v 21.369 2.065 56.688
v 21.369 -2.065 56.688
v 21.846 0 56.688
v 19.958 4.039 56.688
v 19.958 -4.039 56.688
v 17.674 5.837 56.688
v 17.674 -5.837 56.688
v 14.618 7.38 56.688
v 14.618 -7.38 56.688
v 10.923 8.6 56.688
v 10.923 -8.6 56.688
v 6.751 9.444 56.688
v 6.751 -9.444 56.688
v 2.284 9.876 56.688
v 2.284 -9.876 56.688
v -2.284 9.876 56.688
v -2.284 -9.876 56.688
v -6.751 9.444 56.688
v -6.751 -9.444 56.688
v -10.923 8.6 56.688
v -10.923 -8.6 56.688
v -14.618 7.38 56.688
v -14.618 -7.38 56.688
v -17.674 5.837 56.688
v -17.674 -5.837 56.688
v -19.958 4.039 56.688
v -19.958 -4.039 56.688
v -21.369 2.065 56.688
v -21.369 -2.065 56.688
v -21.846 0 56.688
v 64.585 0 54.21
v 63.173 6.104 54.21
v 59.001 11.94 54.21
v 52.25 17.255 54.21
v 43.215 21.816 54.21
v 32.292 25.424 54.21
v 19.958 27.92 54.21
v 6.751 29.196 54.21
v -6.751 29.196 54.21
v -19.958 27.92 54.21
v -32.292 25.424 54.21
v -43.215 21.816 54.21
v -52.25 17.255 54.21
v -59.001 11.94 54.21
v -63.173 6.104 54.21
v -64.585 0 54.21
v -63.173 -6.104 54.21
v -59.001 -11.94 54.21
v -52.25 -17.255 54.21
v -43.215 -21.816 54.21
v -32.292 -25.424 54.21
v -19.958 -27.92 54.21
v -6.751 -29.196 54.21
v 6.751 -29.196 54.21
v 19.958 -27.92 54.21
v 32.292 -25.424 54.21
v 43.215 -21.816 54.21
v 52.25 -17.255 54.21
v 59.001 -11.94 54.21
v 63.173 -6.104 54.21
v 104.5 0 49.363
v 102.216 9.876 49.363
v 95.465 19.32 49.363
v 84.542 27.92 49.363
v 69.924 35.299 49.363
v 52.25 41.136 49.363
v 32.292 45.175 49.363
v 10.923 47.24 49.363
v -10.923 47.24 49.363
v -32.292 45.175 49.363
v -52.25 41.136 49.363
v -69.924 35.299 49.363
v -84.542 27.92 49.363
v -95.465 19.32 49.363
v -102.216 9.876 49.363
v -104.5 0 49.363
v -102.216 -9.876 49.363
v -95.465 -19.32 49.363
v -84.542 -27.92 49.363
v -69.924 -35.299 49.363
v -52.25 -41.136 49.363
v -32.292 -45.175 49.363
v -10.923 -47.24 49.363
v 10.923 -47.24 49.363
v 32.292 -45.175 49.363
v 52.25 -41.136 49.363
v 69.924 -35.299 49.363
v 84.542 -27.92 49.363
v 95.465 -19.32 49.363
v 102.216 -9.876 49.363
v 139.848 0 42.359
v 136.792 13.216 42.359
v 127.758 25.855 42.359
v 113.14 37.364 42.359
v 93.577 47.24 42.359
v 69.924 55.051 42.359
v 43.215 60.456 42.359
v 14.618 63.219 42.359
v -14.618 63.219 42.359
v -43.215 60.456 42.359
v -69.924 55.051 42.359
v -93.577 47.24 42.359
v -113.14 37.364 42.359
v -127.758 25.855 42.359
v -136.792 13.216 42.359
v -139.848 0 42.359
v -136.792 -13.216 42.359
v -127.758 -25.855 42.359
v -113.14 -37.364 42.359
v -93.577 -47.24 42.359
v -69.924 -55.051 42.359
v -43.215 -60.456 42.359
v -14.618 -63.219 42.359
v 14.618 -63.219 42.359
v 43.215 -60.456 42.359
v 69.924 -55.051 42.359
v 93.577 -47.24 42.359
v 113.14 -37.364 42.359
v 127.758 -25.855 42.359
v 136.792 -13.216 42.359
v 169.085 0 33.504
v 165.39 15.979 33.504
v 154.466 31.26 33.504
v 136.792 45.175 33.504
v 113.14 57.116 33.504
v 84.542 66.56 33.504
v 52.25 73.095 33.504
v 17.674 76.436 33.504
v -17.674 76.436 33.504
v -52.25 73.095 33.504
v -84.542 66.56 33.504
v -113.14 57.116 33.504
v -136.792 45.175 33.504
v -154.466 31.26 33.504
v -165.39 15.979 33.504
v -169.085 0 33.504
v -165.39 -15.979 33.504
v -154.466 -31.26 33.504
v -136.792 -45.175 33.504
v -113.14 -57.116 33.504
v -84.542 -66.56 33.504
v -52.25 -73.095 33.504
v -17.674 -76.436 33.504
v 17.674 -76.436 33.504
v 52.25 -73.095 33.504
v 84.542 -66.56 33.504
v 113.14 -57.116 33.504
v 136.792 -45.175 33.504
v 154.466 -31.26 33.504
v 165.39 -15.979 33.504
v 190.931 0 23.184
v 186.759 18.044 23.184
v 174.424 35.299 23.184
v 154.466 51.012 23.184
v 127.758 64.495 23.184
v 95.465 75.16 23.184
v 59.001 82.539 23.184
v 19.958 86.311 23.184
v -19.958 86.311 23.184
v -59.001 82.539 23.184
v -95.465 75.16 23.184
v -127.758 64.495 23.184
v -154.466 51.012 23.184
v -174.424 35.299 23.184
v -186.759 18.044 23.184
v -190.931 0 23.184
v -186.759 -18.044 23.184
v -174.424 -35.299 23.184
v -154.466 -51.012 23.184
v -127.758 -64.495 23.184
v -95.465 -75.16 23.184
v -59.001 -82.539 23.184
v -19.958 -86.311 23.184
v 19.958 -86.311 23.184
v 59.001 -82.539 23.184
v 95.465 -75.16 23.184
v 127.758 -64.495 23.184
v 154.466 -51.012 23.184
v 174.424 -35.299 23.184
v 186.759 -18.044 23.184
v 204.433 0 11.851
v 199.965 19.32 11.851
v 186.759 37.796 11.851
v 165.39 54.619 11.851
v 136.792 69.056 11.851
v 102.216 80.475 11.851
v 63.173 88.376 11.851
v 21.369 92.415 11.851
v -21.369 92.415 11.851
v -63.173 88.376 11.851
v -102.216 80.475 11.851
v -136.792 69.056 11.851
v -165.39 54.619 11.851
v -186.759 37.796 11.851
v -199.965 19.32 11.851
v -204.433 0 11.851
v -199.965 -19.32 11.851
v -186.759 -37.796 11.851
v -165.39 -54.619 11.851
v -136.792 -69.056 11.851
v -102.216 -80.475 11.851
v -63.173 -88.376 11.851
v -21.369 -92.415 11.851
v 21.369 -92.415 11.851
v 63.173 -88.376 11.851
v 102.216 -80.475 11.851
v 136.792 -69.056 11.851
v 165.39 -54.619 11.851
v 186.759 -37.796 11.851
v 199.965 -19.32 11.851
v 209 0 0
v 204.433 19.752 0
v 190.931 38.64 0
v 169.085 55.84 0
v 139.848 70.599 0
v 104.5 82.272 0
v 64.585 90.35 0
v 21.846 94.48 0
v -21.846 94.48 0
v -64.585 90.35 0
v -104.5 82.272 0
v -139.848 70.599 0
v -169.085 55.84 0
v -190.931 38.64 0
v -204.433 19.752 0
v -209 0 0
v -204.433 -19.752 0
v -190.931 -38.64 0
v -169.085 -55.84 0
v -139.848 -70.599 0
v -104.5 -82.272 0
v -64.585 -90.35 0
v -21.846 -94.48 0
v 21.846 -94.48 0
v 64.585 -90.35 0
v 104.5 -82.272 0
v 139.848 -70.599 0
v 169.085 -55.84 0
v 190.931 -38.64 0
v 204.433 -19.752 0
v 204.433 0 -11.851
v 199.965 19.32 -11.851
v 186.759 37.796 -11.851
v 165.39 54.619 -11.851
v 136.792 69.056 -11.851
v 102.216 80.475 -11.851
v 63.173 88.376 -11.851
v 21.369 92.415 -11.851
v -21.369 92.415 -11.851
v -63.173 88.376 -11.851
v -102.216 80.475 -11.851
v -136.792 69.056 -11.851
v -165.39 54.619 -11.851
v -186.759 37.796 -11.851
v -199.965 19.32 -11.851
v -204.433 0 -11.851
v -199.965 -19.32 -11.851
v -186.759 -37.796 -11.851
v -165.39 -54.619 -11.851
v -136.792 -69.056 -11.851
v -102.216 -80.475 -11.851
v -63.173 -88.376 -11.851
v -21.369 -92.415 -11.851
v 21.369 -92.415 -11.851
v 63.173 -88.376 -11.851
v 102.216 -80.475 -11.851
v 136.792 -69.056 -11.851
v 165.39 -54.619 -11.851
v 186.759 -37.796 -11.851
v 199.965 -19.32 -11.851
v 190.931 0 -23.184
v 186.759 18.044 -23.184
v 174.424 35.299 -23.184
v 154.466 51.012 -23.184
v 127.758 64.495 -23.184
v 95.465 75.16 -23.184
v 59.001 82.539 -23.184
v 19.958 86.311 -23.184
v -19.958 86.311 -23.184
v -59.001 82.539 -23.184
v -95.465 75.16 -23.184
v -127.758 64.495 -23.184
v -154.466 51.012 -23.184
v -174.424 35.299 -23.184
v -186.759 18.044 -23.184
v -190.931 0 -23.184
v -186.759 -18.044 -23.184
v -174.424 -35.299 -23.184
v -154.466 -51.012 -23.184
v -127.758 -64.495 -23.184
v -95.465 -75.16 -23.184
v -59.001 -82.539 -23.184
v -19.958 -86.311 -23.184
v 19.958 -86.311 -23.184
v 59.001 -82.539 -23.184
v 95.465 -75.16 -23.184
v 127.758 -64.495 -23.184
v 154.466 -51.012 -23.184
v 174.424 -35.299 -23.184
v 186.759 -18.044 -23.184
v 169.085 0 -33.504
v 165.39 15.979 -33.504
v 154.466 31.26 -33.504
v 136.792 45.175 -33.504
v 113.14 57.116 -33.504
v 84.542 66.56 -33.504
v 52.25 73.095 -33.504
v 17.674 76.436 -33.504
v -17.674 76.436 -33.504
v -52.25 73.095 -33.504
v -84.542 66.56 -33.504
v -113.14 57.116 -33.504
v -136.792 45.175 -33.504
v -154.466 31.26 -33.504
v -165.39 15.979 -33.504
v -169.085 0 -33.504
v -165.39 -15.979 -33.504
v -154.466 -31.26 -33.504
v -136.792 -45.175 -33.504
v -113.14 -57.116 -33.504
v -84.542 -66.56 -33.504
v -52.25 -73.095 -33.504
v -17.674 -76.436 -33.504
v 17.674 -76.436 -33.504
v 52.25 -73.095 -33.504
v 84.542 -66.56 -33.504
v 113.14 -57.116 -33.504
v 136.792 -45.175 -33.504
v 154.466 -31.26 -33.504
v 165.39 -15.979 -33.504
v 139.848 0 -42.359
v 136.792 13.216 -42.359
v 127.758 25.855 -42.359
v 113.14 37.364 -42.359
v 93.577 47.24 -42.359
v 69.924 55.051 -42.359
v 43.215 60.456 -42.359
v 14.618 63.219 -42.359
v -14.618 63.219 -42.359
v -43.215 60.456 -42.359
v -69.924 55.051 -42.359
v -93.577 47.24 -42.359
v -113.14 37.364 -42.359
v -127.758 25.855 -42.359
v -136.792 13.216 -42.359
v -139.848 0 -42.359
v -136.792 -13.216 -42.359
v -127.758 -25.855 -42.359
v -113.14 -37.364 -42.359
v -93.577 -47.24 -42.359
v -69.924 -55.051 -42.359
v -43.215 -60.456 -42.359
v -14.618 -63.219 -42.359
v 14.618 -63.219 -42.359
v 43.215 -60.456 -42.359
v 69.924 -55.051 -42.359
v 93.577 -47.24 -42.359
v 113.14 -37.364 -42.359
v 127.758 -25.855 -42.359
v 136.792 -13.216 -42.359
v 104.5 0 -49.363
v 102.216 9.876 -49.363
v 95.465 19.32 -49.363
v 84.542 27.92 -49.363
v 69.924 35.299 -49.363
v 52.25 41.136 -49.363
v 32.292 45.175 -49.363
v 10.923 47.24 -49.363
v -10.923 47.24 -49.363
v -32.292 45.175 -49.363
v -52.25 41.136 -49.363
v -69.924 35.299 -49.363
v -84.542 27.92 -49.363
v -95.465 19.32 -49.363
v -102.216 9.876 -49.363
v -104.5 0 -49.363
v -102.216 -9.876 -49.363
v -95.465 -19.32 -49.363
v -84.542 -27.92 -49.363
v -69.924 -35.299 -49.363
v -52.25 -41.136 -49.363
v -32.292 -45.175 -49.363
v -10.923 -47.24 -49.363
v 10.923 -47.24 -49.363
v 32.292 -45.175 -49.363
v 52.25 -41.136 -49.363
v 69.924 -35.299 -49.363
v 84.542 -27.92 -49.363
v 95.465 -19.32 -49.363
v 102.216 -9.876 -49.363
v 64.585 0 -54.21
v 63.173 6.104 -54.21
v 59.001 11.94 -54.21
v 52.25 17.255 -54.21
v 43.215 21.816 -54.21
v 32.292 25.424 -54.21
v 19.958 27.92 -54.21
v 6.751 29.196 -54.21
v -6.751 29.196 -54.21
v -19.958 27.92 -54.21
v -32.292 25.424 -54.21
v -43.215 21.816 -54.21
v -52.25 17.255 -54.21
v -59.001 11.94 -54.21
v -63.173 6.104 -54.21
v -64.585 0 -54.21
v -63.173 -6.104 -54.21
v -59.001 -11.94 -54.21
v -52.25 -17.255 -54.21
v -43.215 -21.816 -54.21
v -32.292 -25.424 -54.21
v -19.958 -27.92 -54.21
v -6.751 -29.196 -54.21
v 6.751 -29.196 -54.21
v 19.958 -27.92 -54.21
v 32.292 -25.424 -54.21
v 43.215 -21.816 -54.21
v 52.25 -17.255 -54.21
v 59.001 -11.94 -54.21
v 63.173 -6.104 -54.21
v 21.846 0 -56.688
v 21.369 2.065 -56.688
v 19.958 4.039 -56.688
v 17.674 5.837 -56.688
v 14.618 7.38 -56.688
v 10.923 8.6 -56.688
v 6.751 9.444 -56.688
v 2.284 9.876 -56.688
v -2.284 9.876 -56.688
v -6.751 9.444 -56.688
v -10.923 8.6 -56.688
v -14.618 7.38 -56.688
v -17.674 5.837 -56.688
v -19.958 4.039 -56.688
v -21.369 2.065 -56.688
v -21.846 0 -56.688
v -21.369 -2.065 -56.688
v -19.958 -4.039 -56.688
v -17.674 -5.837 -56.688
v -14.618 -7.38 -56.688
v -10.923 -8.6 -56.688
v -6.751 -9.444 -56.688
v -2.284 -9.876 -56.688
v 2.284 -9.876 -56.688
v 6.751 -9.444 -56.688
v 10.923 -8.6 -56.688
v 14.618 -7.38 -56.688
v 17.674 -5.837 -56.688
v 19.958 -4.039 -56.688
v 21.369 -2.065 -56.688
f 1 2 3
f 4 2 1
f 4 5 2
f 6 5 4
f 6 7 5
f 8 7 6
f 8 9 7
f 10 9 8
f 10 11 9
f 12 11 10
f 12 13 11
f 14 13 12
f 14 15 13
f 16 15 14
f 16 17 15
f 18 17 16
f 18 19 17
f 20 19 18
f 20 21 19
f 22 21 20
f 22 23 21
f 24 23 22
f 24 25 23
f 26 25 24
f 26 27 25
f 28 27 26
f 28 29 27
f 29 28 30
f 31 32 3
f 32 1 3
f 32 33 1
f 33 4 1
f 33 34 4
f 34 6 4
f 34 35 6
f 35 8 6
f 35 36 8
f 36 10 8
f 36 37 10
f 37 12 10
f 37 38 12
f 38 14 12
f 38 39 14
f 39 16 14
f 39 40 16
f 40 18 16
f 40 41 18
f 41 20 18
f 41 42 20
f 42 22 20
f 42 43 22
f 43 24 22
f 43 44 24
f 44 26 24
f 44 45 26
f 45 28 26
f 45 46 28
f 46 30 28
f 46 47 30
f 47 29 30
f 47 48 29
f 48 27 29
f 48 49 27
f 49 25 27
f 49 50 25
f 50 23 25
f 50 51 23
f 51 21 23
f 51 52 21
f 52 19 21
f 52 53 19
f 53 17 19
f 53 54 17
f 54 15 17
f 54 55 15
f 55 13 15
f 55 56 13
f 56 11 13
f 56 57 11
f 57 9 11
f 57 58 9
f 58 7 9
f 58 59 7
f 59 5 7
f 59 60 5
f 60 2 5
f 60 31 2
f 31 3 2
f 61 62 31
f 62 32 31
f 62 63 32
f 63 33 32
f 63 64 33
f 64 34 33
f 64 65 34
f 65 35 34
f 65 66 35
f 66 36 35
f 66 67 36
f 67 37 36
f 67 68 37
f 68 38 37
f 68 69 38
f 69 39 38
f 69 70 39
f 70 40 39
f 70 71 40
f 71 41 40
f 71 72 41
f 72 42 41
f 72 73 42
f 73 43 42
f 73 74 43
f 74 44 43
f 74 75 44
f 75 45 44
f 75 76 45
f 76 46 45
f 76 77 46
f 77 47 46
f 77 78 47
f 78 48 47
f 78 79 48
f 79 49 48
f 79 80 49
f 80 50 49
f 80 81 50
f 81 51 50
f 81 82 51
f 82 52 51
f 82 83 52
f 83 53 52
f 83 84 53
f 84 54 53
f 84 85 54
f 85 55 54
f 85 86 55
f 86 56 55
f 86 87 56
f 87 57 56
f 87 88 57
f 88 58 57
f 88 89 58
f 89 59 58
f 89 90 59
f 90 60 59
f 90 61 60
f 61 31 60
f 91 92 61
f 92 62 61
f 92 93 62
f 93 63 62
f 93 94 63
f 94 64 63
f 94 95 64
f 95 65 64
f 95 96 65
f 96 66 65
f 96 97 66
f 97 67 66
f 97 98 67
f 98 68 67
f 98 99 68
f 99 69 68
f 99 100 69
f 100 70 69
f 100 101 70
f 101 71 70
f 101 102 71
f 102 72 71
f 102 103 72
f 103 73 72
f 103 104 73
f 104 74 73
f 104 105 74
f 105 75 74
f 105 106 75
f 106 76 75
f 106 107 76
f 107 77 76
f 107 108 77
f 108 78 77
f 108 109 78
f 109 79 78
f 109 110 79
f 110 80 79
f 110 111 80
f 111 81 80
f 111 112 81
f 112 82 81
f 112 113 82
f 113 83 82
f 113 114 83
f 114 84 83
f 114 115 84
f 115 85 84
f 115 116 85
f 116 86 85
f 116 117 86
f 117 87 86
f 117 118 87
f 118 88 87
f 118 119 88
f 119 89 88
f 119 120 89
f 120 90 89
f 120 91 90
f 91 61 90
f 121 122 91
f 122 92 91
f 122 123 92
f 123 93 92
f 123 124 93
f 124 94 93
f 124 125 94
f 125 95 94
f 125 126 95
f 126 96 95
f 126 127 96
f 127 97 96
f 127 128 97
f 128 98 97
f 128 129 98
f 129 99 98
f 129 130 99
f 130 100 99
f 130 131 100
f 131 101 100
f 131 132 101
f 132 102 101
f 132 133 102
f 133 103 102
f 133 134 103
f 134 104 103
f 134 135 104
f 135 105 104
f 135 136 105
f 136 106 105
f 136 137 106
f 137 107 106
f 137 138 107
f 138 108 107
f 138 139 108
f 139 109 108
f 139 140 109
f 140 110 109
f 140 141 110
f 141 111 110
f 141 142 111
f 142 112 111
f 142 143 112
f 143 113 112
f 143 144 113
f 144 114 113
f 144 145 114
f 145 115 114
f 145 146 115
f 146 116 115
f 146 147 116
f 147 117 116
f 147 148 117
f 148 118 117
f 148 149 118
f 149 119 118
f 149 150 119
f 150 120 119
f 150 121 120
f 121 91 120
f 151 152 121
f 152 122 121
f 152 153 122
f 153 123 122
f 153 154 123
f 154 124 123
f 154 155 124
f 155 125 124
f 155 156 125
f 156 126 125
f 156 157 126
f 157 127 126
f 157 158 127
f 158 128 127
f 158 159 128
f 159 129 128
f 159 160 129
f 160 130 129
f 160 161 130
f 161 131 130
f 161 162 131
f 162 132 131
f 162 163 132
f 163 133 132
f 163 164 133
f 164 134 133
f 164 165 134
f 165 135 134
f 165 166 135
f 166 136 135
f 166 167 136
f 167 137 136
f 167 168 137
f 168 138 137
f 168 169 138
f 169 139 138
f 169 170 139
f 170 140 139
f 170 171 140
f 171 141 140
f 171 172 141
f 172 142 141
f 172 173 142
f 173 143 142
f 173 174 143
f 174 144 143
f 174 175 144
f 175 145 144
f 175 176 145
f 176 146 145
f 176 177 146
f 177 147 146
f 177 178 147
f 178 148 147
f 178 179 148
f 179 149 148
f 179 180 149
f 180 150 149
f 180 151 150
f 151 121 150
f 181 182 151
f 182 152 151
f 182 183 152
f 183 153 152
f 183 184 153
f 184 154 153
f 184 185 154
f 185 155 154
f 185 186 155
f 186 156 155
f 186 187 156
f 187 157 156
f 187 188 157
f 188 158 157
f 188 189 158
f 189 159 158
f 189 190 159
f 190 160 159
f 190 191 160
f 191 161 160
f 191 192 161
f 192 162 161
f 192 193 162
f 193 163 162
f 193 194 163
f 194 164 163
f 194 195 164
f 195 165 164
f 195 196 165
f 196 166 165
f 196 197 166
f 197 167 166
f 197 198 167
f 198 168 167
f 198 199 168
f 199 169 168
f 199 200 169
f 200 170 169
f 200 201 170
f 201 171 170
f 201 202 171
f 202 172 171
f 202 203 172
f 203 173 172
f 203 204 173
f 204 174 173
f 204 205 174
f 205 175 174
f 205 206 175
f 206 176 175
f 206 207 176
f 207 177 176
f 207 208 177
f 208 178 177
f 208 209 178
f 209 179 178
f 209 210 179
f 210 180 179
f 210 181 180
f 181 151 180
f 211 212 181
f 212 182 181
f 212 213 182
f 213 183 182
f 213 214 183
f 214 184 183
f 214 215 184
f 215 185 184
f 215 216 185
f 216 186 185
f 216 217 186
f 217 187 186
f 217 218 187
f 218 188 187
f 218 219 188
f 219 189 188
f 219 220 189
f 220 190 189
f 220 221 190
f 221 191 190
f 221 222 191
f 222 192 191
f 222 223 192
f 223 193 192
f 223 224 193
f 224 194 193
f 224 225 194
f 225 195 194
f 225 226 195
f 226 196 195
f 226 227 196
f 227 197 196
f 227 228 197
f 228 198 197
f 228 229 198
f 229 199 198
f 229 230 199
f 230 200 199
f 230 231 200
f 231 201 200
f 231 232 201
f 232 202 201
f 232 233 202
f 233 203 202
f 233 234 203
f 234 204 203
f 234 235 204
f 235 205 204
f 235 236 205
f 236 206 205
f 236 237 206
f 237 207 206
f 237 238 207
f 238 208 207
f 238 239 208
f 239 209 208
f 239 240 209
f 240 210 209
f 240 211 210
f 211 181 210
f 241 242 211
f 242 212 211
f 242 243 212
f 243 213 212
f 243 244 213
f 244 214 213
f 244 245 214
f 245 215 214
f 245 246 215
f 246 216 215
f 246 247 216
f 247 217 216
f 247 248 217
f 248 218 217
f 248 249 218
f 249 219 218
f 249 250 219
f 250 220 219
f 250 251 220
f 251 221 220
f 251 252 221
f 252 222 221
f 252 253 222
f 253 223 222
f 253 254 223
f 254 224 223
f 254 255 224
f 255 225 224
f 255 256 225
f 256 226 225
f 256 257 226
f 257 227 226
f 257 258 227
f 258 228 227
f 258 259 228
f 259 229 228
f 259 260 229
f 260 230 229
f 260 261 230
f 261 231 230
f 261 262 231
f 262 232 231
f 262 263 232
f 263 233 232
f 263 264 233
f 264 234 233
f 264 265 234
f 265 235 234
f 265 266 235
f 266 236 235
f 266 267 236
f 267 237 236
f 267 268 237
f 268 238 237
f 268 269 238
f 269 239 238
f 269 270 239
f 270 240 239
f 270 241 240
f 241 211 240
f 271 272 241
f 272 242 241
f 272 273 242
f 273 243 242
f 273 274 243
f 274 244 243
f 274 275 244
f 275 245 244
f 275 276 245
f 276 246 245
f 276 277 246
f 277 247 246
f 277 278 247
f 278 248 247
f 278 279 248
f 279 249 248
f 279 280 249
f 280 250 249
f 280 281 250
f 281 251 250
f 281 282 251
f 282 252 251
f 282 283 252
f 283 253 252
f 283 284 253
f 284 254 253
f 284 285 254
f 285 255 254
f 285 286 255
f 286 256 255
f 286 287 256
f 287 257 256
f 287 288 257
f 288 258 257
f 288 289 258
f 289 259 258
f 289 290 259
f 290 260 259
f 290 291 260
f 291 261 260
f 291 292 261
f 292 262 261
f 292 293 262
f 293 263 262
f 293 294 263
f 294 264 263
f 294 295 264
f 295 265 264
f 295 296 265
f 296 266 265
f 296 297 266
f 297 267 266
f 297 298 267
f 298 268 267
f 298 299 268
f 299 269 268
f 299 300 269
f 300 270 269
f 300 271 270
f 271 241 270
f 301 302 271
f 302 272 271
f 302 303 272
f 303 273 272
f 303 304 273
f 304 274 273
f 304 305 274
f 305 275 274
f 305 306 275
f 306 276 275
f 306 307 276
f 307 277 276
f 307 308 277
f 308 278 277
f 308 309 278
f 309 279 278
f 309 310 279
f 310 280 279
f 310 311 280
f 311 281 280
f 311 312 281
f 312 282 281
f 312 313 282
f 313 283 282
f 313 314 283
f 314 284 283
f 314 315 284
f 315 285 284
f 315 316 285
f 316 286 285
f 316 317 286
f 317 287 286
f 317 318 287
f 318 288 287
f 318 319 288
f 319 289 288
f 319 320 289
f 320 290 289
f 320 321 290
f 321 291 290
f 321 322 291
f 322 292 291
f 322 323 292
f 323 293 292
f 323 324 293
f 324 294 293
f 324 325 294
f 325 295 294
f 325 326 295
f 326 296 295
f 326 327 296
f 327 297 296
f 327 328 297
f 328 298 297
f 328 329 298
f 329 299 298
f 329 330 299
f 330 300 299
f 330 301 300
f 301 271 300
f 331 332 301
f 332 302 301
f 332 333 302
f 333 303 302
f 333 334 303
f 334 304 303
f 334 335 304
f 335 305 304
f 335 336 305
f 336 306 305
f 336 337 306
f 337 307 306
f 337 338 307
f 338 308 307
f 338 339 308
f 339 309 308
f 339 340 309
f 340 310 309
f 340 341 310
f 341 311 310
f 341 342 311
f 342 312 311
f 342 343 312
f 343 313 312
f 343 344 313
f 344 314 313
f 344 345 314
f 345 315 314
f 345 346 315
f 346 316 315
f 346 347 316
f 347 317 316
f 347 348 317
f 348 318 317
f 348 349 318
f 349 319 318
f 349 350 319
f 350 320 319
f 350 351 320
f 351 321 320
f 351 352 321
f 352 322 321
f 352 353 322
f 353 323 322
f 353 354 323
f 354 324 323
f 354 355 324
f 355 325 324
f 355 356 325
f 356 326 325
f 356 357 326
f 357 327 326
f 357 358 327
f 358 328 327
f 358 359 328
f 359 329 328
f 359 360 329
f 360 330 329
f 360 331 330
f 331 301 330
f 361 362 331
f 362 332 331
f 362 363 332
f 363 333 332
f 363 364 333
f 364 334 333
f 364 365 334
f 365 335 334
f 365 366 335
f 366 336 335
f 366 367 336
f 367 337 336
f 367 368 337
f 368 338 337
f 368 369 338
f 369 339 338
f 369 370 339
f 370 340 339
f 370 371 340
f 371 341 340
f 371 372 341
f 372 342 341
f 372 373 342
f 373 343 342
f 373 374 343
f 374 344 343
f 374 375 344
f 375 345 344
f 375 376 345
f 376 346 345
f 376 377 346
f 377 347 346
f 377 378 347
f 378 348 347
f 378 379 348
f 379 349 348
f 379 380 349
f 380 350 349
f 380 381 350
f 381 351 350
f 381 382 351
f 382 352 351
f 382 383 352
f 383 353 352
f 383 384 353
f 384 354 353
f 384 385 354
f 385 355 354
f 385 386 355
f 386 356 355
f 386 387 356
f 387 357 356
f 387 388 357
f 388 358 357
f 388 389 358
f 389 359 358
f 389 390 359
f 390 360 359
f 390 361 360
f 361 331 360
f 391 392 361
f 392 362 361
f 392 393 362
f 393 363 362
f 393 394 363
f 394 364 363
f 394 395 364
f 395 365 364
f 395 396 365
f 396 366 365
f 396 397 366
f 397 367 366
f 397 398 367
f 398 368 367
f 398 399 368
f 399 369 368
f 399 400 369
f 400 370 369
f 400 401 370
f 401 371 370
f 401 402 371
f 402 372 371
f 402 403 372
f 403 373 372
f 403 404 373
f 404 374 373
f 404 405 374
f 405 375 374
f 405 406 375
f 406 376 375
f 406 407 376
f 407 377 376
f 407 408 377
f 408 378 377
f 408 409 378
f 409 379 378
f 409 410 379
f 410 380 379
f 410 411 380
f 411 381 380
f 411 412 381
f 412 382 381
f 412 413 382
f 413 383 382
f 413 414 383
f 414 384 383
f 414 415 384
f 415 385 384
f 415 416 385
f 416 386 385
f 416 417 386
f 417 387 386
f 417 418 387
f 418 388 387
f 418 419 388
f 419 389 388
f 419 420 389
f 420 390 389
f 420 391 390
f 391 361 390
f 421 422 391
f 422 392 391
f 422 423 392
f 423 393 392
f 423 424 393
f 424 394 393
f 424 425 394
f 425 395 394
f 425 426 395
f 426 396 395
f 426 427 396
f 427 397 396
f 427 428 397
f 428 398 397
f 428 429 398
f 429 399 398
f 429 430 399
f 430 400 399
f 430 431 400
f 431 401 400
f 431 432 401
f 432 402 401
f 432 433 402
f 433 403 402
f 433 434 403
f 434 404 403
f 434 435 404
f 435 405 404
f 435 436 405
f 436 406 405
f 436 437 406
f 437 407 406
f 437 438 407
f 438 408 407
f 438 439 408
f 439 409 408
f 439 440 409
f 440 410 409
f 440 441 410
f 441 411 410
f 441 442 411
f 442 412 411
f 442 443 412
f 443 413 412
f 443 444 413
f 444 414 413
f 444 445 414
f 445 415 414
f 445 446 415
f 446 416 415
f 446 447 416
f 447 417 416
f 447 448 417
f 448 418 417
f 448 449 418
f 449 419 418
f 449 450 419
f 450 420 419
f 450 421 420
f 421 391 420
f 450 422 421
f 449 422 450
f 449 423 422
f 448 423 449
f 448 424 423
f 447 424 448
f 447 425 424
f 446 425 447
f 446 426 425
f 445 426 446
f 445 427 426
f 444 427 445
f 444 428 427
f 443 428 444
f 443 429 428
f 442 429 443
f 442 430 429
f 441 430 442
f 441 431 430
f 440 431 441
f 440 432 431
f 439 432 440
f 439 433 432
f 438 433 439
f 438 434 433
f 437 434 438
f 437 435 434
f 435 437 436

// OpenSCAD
// Generated by SolidPython 1.0.1 on 2020-07-29 00:46:49


scale(v = [11, 5, 3]) {
	sphere(r = 19);
}
/***********************************************
*********      SolidPython code:      **********
************************************************
 
# import packages: SolidPython
from solid import *
from solid.utils import *
from itertools import chain, combinations, permutations


class Resize:

    def __init__(self, scad_file):
        self.scad_file = scad_file
        #self.scad_file = import_scad(scad_file)
        # cone/cylinder param:
        self.r1 = 0
        self.r2 = 0
        self.h = 0
        # rectangular prism param:
        self.w = 0
        self.l = 0
        # ellipse param:
        self.r = 0

    # import OpenScad code (file name corresponds to shape)


    # classify shape + parameters
    def assign(self, param1, param2, param3):
        if self.scad_file == 'cone.scad':
            self.r1 = param1
            self.r2 = param2
            self.h = param3
        elif self.scad_file == 'cylinder.scad':
            self.r1 = param1
            self.r2 = param2
            self.h = param3
        elif self.scad_file == 'rectangularPrism.scad':
            self.h = param1
            self.l = param2
            self.w = param3
        else:
            self.r = param1
            self.h = param2

    # resize parameters
    def iterate(self):
        x = range(3, 20, 2)
        i = 1
        if self.scad_file == 'cone.scad':
            tempList = list(permutations(x, 2))
            for temp in tempList:
                param1 = temp[0]
                param2 = temp[1]
                filepath = 'produced_scad_files/' + 'cone' + str(param1) + '_' + str(param2) + '_' + '.scad'
                scad_render_to_file(cylinder(h=param1, r1=param2, r2=0), filepath)

        elif self.scad_file == 'cylinder.scad':
            tempList = list(permutations(x, 3))
            for temp in tempList:
                param1 = temp[0]
                param2 = temp[1]
                filepath = 'produced_scad_files/' + 'cylinder' + str(param1) + '_' + str(param2) + '_' + '.scad'
                scad_render_to_file(cylinder(h=param1, r1=param2, r2=param2), filepath)

        elif self.scad_file == 'rectangularPrism.scad':
            tempList = list(permutations(x, 3))
            for temp in tempList:
                param1 = temp[0]
                param2 = temp[1]
                param3 = temp[2]
                filepath = 'produced_scad_files/' + 'rectangularPrism' + str(param1) + '_' + str(param2) + '_' + str(
                    param3) + '.scad'
                scad_render_to_file(cube(size=(param1, param2, param3)), filepath)

        elif self.scad_file == 'ellipse.scad':
            tempList = list(permutations(x, 4))
            for temp in tempList:
                param1 = temp[0]
                param2 = temp[1]
                param3 = temp[2]
                param4 = temp[3]
                filepath = 'produced_scad_files/' + 'ellipse' + str(param1) + '_' + str(param2) + '_' + str(param3) + '_' + str(param4) + '.scad'
                scad_render_to_file(scale([param1, param2, param3])(sphere(r=param4)), filepath)

    def render_to_scadfile(self):
        scad_render_to_file(scad, 'example.scad') 
 
************************************************/
